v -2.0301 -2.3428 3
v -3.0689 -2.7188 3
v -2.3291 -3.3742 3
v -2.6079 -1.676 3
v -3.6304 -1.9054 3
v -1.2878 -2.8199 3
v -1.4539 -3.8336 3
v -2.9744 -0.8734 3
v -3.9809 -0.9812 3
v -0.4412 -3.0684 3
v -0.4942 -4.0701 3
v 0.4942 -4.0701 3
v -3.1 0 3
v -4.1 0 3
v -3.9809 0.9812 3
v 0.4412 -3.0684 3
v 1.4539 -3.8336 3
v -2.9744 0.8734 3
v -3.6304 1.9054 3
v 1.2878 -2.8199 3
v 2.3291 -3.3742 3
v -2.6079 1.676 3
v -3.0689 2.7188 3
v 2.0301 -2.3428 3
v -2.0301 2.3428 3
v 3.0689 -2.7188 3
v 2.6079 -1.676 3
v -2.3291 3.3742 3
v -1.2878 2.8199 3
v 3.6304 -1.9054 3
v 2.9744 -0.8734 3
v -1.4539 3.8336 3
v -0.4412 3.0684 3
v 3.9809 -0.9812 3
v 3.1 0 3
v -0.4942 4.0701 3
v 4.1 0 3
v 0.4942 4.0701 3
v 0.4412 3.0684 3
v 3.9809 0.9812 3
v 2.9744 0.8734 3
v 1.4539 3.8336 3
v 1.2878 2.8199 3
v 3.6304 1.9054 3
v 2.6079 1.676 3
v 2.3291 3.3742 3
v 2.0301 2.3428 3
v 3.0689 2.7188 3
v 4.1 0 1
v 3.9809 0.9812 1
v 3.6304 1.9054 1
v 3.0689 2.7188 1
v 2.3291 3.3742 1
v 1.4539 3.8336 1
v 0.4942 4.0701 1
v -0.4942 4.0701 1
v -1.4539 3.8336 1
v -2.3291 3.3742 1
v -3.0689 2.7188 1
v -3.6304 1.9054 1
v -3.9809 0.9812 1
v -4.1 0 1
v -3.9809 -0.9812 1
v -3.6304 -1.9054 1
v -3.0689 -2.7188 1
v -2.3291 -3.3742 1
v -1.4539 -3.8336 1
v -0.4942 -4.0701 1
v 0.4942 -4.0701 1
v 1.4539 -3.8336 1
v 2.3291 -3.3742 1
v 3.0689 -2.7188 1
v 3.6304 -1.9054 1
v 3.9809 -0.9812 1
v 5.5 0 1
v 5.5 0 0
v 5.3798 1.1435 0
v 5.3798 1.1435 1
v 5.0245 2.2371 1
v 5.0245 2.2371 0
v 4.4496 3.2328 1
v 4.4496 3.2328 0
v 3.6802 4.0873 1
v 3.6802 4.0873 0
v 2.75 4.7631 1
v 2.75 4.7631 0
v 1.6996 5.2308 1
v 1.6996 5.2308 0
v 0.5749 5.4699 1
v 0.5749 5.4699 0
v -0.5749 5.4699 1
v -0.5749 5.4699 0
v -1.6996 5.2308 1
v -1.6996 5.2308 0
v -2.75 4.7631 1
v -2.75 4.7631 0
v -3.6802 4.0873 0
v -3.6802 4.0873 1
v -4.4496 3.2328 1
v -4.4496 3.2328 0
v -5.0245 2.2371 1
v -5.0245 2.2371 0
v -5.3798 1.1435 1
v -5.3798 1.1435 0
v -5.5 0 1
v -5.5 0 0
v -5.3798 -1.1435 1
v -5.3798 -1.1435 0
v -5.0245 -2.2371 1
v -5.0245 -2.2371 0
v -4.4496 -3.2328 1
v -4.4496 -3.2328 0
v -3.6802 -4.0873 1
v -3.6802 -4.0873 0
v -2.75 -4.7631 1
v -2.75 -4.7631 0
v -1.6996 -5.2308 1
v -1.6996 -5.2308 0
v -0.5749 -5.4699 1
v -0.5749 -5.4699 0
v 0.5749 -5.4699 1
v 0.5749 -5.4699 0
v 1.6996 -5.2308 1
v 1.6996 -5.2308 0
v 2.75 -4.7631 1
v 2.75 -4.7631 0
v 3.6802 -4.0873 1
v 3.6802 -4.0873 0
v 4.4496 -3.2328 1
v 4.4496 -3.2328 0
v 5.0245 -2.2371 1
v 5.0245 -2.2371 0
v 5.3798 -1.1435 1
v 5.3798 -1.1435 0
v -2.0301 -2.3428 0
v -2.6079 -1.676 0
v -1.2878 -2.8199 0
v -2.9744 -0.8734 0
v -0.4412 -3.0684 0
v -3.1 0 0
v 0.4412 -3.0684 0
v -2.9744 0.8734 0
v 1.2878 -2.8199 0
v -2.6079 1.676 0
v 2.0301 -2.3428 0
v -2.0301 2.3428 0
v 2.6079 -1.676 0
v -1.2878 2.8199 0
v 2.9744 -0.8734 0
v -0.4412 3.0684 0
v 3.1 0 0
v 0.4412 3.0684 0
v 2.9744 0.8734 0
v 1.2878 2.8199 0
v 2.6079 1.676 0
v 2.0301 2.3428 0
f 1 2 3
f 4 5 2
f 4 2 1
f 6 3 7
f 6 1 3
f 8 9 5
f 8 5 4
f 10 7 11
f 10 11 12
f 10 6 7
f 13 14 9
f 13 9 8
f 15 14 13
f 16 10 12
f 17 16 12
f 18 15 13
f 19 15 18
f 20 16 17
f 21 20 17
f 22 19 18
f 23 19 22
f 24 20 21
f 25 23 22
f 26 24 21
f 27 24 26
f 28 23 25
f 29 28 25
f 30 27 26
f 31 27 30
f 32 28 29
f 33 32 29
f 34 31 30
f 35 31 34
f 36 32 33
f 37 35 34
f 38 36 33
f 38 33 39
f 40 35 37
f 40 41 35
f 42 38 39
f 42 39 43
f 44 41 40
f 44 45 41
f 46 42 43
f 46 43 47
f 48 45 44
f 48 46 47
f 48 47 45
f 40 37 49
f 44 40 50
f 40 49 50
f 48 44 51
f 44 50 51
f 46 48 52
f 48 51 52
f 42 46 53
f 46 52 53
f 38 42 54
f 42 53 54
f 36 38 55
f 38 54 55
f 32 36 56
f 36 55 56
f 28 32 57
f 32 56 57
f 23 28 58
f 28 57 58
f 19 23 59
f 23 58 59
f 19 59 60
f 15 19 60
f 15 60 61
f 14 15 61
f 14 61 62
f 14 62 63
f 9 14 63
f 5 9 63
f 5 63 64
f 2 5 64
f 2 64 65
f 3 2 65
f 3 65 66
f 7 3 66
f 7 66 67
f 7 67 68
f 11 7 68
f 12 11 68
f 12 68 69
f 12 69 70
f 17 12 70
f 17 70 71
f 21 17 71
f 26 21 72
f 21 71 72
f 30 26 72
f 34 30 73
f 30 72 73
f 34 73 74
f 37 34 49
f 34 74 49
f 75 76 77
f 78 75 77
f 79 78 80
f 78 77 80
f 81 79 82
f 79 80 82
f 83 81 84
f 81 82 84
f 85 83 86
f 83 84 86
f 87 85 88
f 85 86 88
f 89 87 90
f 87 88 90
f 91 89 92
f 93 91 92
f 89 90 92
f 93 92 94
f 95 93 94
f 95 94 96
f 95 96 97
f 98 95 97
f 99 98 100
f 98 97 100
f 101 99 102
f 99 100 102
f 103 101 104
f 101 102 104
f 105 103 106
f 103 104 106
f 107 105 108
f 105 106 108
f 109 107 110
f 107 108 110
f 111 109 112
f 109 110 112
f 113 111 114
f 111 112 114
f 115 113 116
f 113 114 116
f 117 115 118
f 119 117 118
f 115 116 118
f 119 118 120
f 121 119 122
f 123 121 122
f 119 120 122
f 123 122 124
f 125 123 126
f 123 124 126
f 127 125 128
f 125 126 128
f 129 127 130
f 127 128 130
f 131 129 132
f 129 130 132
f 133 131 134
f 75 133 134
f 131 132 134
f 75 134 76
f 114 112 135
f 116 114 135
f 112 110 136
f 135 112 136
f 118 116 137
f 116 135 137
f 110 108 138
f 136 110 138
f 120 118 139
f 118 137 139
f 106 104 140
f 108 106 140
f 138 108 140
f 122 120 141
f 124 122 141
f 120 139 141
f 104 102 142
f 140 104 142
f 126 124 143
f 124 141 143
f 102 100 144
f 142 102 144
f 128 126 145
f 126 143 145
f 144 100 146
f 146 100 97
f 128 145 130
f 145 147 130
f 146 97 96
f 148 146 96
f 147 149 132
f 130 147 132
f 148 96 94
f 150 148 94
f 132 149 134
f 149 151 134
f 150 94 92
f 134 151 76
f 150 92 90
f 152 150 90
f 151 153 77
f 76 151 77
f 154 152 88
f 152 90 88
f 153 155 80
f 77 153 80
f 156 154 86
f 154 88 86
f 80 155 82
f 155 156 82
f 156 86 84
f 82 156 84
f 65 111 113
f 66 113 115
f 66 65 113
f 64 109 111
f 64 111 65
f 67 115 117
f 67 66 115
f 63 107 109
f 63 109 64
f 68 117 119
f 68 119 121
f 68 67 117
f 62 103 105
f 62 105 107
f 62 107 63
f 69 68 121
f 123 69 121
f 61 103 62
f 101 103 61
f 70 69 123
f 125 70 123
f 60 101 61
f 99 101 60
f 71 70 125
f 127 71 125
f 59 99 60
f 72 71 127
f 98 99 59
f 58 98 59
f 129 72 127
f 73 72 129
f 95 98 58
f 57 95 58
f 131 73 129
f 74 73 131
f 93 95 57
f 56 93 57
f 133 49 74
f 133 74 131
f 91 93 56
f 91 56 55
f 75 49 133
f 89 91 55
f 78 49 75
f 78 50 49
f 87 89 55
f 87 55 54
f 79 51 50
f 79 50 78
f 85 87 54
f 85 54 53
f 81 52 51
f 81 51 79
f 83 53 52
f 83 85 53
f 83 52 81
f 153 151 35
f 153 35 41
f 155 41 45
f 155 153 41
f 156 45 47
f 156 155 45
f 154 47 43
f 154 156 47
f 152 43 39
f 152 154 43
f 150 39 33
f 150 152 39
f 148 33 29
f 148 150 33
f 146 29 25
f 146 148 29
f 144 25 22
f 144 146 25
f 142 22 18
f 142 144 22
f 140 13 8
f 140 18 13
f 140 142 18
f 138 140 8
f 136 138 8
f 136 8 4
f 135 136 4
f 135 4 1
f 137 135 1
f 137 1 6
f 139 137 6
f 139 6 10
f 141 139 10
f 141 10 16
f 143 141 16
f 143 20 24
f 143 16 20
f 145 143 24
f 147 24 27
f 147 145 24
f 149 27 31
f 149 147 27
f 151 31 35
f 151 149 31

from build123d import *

# Parameters (mm, degrees)
SKETCH_R     = 5.5
PAD_DEPTH    = 1
SKETCH001_R  = 4.1
PAD001_DEPTH = 3
SKETCH002_R  = 3.1
POCKET_DEPTH = 3.001


with BuildPart() as part:
    # Sketch → Pad (new body)
    with BuildSketch(Plane.XY):
        Circle(SKETCH_R)
    extrude(amount=PAD_DEPTH)

    # Sketch001 → Pad001 (join)
    with BuildSketch(Plane.XY):
        Circle(SKETCH001_R)
    extrude(amount=PAD001_DEPTH)

    # Sketch002 → Pocket (cut, through all)
    with BuildSketch(Plane.XY):
        Circle(SKETCH002_R)
    extrude(amount=POCKET_DEPTH, mode=Mode.SUBTRACT)


solid = part.part
